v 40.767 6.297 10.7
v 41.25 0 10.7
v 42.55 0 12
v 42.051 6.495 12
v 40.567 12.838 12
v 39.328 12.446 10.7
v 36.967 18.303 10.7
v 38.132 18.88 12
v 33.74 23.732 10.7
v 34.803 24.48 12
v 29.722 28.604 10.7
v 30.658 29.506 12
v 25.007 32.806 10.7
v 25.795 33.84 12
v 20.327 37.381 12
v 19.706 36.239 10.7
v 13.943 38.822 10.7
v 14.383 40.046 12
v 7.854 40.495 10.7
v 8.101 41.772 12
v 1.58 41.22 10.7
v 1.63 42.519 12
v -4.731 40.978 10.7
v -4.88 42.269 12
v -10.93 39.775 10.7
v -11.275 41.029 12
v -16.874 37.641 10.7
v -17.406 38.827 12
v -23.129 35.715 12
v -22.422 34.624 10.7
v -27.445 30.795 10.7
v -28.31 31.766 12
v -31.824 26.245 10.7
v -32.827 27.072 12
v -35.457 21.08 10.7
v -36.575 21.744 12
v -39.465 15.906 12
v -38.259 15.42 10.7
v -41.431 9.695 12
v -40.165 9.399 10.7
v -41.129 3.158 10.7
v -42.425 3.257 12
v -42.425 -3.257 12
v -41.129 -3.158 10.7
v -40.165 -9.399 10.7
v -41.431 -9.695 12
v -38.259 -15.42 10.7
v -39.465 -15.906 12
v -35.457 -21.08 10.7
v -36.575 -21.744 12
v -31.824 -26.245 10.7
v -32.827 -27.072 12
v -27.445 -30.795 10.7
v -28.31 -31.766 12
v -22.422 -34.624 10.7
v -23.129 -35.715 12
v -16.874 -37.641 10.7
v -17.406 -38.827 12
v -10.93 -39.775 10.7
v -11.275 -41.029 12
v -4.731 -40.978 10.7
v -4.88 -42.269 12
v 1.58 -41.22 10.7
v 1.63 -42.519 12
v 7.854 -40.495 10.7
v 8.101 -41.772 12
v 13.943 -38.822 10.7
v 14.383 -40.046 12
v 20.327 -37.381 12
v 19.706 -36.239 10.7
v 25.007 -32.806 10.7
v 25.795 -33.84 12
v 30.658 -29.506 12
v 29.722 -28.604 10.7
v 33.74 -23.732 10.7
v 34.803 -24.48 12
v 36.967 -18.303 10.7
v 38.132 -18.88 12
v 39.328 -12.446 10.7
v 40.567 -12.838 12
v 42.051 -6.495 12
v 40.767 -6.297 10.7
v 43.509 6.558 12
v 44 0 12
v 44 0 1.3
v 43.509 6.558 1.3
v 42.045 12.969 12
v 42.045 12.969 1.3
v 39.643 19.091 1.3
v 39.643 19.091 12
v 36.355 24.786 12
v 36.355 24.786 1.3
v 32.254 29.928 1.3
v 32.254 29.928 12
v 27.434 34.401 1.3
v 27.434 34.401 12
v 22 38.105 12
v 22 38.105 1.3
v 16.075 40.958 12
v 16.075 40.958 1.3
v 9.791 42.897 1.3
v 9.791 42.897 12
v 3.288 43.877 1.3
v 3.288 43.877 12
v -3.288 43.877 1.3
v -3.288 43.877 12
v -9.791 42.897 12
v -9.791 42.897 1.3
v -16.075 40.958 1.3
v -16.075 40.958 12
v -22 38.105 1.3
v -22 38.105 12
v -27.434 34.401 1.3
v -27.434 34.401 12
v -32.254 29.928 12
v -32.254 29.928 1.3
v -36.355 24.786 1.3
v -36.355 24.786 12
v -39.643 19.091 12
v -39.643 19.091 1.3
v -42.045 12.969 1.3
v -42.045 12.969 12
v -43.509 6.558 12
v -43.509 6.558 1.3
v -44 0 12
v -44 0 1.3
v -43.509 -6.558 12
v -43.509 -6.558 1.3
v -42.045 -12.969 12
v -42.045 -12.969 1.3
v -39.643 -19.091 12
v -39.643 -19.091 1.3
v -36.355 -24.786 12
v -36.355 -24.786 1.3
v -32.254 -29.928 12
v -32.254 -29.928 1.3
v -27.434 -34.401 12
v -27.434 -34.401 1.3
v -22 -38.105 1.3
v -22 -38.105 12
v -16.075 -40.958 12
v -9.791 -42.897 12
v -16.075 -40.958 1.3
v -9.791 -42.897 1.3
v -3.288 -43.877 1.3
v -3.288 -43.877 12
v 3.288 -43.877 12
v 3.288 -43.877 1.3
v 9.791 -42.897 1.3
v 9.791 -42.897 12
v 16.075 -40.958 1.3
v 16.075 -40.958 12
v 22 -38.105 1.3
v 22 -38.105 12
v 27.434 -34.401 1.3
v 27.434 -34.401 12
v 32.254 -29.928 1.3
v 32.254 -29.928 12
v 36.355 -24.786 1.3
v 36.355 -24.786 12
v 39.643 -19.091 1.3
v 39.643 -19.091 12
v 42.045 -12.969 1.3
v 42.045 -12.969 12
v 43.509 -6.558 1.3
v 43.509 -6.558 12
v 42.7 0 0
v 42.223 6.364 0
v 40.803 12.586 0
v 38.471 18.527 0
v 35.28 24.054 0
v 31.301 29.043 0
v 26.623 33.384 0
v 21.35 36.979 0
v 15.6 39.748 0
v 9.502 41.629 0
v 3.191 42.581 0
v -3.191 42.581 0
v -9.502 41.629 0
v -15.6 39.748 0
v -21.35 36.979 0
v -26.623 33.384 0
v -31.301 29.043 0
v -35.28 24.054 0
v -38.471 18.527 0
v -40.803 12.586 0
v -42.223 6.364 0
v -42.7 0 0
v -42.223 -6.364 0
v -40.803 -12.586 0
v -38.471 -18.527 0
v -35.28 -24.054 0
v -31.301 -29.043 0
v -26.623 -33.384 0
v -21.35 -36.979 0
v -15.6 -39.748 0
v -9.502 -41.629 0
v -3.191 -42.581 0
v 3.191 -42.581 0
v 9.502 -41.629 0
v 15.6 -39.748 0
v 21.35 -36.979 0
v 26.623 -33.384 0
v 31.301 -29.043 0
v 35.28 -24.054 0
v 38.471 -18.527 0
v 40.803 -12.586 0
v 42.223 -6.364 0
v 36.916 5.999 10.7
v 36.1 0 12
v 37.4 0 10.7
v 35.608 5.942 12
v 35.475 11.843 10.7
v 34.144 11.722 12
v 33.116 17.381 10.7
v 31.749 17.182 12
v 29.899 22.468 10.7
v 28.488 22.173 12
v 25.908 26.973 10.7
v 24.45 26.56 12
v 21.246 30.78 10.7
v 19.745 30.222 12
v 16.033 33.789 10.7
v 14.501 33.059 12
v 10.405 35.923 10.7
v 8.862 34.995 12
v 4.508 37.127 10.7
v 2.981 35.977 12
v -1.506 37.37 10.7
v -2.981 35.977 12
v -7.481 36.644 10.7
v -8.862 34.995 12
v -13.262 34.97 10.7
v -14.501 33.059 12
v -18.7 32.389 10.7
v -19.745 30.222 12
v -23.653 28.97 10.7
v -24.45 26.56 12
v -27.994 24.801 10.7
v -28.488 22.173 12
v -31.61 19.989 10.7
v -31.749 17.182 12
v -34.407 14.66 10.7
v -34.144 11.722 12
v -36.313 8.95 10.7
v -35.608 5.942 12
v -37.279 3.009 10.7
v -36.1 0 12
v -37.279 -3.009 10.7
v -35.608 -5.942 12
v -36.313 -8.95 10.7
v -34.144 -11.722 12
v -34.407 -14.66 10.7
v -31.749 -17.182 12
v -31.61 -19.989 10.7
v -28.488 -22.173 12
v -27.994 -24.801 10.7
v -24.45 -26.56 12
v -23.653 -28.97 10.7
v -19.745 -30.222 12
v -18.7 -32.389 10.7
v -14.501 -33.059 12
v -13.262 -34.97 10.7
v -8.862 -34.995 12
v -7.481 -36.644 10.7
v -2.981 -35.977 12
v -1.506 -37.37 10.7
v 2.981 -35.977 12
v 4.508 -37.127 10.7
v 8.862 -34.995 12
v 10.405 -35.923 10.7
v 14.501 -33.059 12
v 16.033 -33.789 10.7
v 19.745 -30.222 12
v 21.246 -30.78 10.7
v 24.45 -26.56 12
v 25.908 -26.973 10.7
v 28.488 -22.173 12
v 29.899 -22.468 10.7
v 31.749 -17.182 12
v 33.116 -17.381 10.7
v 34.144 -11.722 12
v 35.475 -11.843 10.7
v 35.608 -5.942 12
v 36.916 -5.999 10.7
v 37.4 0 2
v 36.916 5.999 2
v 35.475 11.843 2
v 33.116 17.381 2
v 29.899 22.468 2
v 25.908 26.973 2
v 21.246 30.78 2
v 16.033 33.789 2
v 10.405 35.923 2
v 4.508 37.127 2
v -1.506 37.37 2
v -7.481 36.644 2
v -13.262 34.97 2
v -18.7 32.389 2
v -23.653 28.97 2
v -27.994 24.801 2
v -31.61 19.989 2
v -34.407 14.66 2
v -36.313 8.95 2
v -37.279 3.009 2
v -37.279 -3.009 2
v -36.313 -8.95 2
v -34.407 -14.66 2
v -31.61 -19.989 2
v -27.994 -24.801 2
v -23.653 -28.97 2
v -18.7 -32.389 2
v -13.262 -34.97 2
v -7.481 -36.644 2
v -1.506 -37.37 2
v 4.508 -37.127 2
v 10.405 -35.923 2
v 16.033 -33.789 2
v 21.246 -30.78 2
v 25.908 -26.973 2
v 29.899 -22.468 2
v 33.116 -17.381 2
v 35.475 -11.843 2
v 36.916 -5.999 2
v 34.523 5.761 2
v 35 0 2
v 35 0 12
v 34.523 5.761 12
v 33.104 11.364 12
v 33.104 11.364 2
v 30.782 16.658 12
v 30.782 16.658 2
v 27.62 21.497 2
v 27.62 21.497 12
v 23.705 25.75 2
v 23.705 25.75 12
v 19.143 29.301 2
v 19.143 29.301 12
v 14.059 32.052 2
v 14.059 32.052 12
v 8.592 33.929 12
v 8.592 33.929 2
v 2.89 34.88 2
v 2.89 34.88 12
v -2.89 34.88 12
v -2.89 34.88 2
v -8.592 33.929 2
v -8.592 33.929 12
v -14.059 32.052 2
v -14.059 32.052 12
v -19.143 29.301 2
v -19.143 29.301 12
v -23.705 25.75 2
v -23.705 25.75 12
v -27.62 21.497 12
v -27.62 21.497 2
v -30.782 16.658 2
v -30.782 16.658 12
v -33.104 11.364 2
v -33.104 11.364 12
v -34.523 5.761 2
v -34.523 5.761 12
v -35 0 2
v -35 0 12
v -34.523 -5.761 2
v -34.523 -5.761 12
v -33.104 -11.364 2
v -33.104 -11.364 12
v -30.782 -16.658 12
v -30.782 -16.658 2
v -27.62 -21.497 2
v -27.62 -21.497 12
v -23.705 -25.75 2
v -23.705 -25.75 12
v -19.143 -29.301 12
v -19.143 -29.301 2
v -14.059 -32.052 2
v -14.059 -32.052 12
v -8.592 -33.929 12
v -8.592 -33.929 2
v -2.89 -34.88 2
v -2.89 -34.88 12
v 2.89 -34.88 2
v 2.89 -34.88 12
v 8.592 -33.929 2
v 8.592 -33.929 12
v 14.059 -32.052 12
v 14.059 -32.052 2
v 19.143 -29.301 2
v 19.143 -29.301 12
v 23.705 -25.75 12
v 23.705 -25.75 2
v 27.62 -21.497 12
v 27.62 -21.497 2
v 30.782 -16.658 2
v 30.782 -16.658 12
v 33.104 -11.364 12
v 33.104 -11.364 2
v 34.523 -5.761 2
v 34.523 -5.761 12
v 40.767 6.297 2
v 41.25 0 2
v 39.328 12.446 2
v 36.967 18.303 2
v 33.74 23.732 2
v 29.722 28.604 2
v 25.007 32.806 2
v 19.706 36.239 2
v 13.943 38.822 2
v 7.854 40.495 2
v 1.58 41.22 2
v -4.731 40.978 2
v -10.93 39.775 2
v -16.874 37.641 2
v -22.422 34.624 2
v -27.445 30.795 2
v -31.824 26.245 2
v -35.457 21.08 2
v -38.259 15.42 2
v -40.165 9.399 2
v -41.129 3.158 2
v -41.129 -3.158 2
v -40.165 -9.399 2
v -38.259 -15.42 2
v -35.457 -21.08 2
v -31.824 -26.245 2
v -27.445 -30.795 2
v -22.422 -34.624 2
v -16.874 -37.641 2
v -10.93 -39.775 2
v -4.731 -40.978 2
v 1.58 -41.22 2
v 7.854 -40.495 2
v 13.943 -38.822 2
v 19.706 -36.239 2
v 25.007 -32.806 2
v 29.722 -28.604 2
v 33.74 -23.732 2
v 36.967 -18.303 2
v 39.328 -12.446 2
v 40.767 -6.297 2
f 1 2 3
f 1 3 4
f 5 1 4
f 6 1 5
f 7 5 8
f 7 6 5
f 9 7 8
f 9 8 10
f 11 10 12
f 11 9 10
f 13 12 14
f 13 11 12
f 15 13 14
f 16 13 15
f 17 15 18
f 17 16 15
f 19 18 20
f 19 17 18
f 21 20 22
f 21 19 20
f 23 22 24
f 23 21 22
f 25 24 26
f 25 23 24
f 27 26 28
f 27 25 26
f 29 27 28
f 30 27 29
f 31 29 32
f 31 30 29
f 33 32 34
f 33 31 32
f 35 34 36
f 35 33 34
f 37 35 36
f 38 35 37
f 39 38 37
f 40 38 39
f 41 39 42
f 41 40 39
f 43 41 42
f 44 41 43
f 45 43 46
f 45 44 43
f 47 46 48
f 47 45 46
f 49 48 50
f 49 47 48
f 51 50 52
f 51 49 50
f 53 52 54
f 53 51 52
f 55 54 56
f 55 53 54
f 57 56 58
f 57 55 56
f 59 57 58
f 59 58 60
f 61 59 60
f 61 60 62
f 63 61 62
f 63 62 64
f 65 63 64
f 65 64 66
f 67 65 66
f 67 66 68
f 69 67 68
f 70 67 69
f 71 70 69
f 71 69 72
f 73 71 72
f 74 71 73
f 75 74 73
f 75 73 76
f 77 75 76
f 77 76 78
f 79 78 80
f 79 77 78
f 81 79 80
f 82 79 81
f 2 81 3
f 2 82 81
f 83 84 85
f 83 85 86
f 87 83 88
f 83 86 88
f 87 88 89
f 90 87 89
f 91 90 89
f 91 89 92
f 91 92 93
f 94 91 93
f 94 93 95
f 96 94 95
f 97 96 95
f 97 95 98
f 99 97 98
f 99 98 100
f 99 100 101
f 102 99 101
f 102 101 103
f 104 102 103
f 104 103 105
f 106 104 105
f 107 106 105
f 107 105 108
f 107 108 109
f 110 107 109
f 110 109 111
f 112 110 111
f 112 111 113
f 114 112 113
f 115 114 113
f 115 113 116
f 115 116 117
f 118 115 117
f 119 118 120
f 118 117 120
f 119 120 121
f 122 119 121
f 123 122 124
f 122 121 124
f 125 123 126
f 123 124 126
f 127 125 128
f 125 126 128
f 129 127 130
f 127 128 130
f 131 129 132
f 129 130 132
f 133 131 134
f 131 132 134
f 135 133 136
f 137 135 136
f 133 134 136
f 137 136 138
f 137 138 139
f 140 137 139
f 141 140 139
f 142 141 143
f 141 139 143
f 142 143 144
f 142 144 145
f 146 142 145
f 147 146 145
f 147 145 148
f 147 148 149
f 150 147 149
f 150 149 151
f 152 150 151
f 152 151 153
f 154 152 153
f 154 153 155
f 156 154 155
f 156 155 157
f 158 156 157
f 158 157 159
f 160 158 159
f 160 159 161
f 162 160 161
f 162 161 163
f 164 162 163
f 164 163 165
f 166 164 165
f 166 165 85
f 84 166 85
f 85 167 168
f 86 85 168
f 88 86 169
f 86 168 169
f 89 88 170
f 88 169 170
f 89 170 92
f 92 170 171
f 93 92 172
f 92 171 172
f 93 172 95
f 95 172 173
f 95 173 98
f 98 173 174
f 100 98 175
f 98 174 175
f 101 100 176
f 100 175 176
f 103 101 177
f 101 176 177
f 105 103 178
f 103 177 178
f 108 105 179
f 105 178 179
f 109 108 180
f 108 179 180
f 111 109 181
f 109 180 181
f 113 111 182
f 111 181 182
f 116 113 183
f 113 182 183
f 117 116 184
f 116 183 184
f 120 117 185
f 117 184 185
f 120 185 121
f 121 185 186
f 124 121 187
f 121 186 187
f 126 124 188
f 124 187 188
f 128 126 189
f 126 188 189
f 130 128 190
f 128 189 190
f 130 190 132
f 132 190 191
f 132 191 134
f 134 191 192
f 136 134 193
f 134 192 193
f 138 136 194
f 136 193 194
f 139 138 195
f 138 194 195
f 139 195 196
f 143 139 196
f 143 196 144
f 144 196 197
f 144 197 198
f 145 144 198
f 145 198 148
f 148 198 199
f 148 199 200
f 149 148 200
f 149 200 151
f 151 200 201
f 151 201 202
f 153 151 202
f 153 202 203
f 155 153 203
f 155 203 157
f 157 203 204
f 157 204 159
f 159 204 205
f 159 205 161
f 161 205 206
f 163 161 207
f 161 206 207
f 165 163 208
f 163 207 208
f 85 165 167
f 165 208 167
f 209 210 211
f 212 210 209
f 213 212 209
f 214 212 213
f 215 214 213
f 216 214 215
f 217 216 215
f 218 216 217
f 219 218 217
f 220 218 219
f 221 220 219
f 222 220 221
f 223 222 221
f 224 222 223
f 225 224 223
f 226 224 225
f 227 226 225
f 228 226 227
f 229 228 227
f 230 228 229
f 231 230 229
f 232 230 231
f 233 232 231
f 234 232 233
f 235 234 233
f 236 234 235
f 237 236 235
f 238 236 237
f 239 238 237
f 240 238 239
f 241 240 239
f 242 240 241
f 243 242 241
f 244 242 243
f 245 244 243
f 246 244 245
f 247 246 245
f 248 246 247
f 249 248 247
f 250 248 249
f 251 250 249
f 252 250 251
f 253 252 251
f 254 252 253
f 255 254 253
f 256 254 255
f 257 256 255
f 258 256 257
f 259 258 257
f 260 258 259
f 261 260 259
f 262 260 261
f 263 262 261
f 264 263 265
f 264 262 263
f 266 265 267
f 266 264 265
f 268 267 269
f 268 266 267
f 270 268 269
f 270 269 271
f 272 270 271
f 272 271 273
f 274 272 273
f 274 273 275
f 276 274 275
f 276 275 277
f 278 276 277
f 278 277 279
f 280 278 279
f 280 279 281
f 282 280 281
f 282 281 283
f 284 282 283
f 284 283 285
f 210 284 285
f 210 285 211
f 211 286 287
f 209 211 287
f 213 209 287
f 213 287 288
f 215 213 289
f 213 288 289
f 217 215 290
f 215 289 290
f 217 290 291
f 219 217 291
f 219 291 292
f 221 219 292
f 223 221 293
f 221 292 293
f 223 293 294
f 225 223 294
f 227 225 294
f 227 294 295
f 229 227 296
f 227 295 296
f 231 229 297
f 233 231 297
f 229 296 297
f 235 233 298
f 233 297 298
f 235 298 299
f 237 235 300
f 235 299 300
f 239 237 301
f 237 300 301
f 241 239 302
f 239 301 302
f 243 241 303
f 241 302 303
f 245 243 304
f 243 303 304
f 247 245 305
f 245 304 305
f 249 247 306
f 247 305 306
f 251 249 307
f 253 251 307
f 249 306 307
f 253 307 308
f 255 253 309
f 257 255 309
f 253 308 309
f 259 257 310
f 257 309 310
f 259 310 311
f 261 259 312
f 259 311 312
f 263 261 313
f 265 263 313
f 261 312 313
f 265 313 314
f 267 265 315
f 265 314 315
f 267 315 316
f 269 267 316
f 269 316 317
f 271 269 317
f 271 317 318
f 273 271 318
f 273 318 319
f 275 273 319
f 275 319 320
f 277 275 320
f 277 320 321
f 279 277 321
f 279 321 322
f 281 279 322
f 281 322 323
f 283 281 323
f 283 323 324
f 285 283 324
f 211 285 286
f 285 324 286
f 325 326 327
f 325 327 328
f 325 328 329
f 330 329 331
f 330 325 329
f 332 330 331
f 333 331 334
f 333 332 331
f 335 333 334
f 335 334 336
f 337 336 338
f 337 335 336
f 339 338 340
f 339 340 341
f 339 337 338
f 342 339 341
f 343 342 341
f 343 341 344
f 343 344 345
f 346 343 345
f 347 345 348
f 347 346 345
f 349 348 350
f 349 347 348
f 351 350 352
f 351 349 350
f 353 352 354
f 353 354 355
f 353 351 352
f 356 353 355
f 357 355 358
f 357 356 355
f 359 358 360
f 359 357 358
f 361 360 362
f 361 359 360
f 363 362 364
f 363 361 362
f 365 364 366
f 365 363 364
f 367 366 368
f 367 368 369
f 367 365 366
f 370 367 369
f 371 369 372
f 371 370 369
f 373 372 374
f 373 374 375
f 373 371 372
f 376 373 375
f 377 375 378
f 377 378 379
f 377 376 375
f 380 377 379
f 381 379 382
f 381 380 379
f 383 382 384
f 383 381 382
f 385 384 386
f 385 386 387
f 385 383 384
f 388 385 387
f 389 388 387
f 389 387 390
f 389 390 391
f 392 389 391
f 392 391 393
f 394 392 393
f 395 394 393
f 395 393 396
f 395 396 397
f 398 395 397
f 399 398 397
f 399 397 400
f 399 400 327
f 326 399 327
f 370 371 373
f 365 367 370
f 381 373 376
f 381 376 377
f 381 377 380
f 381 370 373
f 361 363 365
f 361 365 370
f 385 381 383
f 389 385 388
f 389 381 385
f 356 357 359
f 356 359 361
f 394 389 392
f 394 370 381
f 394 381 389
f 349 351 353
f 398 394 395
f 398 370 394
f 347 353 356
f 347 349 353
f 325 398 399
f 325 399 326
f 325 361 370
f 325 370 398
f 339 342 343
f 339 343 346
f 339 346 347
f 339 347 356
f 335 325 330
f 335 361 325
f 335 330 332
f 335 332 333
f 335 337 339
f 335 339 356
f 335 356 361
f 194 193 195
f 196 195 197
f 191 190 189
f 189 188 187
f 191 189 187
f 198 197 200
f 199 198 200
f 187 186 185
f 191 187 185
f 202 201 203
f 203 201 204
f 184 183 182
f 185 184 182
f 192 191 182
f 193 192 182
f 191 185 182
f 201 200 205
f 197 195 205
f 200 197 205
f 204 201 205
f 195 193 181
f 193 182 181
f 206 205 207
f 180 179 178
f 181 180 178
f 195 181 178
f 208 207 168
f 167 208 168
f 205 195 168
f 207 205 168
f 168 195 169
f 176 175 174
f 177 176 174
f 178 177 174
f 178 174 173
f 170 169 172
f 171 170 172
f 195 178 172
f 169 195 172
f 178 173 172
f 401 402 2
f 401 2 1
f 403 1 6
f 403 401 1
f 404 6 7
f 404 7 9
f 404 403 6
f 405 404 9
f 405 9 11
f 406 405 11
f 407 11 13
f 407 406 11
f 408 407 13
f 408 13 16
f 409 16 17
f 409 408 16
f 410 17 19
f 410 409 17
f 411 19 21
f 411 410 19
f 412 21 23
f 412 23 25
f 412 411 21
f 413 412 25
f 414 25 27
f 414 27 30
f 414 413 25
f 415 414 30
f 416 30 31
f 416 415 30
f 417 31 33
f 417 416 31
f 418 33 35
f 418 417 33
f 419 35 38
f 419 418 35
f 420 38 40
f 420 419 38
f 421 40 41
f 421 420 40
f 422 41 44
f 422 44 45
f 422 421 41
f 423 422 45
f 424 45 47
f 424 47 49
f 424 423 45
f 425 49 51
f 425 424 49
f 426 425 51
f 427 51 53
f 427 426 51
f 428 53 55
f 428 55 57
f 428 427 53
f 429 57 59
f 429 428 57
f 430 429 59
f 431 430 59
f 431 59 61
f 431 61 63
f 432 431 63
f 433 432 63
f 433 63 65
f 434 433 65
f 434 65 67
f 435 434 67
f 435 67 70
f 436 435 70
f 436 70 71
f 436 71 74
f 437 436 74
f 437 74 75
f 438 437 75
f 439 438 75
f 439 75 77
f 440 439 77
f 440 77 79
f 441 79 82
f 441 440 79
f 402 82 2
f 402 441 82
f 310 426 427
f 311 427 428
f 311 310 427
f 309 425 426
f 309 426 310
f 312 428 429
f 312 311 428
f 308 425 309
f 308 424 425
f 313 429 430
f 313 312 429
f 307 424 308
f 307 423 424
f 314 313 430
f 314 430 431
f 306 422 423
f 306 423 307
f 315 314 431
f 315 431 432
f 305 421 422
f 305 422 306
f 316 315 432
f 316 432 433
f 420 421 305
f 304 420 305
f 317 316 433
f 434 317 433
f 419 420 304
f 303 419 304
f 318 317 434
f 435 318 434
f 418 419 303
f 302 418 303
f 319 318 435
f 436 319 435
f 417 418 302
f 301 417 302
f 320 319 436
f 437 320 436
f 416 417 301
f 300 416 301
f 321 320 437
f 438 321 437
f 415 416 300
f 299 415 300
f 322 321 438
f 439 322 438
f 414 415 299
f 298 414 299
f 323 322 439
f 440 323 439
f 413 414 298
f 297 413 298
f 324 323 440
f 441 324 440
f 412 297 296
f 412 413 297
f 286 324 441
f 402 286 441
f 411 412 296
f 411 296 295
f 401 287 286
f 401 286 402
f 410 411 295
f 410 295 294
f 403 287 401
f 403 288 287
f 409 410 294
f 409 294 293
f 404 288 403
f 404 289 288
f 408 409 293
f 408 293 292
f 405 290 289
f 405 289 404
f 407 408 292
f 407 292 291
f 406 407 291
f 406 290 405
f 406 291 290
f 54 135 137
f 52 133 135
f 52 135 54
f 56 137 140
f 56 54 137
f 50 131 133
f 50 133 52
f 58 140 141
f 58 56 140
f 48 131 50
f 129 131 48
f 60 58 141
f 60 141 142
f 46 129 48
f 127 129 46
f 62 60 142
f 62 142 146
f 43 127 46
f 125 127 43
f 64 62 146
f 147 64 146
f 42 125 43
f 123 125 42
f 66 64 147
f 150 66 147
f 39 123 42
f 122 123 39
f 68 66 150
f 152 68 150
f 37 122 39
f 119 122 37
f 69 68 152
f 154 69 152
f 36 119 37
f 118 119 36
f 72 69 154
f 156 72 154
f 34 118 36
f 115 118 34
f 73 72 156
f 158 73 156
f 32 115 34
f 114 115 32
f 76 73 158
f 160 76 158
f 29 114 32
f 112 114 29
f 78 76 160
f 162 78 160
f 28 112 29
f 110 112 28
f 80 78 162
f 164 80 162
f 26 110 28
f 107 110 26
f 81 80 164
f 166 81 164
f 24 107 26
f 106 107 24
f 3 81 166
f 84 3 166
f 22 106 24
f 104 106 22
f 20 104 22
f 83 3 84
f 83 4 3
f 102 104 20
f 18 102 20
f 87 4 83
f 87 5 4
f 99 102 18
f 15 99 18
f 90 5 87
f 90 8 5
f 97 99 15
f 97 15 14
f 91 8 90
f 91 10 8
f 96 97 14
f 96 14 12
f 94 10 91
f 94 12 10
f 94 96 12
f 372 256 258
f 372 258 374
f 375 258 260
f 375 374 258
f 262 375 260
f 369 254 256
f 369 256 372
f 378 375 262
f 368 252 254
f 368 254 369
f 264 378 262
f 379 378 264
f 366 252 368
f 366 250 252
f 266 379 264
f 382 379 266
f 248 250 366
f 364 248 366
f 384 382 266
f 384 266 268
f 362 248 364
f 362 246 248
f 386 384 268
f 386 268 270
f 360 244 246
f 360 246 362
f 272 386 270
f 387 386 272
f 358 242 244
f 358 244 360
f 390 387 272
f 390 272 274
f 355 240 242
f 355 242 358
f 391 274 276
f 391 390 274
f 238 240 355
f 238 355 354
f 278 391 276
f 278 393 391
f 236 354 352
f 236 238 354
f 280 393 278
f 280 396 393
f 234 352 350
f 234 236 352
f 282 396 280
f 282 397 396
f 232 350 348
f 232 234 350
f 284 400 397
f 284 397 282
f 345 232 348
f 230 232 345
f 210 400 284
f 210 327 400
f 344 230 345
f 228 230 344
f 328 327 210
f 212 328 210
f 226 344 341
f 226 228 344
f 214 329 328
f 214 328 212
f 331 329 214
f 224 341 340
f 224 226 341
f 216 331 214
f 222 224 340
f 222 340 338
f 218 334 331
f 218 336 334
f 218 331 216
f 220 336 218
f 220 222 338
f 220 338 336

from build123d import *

# Parameters (mm, degrees)
F0_R     = 44
F1_DEPTH = 2
F2_R     = 44
F2_R_2   = 41.25
F2_R_3   = 37.4
F2_R_4   = 35
F3_DEPTH = 10
F4_SIZE  = 1.3


with BuildPart() as f1:
    # F0 (on Top) → F1 (new body)
    with BuildSketch(Plane.XY):
        Circle(F0_R)
    extrude(amount=F1_DEPTH)

    # F2 (on face) → F3 (join)
    with BuildSketch(Plane.XY.offset(2)):
        Circle(F2_R)
        Circle(F2_R_2, mode=Mode.SUBTRACT)
        Circle(F2_R_3)
        Circle(F2_R_4, mode=Mode.SUBTRACT)
    extrude(amount=F3_DEPTH)

    # F4
    f4_edges = [f1.edges().sort_by_distance(p)[0] for p in [
        (-41.25, 0, 12),
        (-37.4, 0, 12),
        (-44, 0, 0),
    ]]
    chamfer(f4_edges, length=F4_SIZE)


solid = f1.part
